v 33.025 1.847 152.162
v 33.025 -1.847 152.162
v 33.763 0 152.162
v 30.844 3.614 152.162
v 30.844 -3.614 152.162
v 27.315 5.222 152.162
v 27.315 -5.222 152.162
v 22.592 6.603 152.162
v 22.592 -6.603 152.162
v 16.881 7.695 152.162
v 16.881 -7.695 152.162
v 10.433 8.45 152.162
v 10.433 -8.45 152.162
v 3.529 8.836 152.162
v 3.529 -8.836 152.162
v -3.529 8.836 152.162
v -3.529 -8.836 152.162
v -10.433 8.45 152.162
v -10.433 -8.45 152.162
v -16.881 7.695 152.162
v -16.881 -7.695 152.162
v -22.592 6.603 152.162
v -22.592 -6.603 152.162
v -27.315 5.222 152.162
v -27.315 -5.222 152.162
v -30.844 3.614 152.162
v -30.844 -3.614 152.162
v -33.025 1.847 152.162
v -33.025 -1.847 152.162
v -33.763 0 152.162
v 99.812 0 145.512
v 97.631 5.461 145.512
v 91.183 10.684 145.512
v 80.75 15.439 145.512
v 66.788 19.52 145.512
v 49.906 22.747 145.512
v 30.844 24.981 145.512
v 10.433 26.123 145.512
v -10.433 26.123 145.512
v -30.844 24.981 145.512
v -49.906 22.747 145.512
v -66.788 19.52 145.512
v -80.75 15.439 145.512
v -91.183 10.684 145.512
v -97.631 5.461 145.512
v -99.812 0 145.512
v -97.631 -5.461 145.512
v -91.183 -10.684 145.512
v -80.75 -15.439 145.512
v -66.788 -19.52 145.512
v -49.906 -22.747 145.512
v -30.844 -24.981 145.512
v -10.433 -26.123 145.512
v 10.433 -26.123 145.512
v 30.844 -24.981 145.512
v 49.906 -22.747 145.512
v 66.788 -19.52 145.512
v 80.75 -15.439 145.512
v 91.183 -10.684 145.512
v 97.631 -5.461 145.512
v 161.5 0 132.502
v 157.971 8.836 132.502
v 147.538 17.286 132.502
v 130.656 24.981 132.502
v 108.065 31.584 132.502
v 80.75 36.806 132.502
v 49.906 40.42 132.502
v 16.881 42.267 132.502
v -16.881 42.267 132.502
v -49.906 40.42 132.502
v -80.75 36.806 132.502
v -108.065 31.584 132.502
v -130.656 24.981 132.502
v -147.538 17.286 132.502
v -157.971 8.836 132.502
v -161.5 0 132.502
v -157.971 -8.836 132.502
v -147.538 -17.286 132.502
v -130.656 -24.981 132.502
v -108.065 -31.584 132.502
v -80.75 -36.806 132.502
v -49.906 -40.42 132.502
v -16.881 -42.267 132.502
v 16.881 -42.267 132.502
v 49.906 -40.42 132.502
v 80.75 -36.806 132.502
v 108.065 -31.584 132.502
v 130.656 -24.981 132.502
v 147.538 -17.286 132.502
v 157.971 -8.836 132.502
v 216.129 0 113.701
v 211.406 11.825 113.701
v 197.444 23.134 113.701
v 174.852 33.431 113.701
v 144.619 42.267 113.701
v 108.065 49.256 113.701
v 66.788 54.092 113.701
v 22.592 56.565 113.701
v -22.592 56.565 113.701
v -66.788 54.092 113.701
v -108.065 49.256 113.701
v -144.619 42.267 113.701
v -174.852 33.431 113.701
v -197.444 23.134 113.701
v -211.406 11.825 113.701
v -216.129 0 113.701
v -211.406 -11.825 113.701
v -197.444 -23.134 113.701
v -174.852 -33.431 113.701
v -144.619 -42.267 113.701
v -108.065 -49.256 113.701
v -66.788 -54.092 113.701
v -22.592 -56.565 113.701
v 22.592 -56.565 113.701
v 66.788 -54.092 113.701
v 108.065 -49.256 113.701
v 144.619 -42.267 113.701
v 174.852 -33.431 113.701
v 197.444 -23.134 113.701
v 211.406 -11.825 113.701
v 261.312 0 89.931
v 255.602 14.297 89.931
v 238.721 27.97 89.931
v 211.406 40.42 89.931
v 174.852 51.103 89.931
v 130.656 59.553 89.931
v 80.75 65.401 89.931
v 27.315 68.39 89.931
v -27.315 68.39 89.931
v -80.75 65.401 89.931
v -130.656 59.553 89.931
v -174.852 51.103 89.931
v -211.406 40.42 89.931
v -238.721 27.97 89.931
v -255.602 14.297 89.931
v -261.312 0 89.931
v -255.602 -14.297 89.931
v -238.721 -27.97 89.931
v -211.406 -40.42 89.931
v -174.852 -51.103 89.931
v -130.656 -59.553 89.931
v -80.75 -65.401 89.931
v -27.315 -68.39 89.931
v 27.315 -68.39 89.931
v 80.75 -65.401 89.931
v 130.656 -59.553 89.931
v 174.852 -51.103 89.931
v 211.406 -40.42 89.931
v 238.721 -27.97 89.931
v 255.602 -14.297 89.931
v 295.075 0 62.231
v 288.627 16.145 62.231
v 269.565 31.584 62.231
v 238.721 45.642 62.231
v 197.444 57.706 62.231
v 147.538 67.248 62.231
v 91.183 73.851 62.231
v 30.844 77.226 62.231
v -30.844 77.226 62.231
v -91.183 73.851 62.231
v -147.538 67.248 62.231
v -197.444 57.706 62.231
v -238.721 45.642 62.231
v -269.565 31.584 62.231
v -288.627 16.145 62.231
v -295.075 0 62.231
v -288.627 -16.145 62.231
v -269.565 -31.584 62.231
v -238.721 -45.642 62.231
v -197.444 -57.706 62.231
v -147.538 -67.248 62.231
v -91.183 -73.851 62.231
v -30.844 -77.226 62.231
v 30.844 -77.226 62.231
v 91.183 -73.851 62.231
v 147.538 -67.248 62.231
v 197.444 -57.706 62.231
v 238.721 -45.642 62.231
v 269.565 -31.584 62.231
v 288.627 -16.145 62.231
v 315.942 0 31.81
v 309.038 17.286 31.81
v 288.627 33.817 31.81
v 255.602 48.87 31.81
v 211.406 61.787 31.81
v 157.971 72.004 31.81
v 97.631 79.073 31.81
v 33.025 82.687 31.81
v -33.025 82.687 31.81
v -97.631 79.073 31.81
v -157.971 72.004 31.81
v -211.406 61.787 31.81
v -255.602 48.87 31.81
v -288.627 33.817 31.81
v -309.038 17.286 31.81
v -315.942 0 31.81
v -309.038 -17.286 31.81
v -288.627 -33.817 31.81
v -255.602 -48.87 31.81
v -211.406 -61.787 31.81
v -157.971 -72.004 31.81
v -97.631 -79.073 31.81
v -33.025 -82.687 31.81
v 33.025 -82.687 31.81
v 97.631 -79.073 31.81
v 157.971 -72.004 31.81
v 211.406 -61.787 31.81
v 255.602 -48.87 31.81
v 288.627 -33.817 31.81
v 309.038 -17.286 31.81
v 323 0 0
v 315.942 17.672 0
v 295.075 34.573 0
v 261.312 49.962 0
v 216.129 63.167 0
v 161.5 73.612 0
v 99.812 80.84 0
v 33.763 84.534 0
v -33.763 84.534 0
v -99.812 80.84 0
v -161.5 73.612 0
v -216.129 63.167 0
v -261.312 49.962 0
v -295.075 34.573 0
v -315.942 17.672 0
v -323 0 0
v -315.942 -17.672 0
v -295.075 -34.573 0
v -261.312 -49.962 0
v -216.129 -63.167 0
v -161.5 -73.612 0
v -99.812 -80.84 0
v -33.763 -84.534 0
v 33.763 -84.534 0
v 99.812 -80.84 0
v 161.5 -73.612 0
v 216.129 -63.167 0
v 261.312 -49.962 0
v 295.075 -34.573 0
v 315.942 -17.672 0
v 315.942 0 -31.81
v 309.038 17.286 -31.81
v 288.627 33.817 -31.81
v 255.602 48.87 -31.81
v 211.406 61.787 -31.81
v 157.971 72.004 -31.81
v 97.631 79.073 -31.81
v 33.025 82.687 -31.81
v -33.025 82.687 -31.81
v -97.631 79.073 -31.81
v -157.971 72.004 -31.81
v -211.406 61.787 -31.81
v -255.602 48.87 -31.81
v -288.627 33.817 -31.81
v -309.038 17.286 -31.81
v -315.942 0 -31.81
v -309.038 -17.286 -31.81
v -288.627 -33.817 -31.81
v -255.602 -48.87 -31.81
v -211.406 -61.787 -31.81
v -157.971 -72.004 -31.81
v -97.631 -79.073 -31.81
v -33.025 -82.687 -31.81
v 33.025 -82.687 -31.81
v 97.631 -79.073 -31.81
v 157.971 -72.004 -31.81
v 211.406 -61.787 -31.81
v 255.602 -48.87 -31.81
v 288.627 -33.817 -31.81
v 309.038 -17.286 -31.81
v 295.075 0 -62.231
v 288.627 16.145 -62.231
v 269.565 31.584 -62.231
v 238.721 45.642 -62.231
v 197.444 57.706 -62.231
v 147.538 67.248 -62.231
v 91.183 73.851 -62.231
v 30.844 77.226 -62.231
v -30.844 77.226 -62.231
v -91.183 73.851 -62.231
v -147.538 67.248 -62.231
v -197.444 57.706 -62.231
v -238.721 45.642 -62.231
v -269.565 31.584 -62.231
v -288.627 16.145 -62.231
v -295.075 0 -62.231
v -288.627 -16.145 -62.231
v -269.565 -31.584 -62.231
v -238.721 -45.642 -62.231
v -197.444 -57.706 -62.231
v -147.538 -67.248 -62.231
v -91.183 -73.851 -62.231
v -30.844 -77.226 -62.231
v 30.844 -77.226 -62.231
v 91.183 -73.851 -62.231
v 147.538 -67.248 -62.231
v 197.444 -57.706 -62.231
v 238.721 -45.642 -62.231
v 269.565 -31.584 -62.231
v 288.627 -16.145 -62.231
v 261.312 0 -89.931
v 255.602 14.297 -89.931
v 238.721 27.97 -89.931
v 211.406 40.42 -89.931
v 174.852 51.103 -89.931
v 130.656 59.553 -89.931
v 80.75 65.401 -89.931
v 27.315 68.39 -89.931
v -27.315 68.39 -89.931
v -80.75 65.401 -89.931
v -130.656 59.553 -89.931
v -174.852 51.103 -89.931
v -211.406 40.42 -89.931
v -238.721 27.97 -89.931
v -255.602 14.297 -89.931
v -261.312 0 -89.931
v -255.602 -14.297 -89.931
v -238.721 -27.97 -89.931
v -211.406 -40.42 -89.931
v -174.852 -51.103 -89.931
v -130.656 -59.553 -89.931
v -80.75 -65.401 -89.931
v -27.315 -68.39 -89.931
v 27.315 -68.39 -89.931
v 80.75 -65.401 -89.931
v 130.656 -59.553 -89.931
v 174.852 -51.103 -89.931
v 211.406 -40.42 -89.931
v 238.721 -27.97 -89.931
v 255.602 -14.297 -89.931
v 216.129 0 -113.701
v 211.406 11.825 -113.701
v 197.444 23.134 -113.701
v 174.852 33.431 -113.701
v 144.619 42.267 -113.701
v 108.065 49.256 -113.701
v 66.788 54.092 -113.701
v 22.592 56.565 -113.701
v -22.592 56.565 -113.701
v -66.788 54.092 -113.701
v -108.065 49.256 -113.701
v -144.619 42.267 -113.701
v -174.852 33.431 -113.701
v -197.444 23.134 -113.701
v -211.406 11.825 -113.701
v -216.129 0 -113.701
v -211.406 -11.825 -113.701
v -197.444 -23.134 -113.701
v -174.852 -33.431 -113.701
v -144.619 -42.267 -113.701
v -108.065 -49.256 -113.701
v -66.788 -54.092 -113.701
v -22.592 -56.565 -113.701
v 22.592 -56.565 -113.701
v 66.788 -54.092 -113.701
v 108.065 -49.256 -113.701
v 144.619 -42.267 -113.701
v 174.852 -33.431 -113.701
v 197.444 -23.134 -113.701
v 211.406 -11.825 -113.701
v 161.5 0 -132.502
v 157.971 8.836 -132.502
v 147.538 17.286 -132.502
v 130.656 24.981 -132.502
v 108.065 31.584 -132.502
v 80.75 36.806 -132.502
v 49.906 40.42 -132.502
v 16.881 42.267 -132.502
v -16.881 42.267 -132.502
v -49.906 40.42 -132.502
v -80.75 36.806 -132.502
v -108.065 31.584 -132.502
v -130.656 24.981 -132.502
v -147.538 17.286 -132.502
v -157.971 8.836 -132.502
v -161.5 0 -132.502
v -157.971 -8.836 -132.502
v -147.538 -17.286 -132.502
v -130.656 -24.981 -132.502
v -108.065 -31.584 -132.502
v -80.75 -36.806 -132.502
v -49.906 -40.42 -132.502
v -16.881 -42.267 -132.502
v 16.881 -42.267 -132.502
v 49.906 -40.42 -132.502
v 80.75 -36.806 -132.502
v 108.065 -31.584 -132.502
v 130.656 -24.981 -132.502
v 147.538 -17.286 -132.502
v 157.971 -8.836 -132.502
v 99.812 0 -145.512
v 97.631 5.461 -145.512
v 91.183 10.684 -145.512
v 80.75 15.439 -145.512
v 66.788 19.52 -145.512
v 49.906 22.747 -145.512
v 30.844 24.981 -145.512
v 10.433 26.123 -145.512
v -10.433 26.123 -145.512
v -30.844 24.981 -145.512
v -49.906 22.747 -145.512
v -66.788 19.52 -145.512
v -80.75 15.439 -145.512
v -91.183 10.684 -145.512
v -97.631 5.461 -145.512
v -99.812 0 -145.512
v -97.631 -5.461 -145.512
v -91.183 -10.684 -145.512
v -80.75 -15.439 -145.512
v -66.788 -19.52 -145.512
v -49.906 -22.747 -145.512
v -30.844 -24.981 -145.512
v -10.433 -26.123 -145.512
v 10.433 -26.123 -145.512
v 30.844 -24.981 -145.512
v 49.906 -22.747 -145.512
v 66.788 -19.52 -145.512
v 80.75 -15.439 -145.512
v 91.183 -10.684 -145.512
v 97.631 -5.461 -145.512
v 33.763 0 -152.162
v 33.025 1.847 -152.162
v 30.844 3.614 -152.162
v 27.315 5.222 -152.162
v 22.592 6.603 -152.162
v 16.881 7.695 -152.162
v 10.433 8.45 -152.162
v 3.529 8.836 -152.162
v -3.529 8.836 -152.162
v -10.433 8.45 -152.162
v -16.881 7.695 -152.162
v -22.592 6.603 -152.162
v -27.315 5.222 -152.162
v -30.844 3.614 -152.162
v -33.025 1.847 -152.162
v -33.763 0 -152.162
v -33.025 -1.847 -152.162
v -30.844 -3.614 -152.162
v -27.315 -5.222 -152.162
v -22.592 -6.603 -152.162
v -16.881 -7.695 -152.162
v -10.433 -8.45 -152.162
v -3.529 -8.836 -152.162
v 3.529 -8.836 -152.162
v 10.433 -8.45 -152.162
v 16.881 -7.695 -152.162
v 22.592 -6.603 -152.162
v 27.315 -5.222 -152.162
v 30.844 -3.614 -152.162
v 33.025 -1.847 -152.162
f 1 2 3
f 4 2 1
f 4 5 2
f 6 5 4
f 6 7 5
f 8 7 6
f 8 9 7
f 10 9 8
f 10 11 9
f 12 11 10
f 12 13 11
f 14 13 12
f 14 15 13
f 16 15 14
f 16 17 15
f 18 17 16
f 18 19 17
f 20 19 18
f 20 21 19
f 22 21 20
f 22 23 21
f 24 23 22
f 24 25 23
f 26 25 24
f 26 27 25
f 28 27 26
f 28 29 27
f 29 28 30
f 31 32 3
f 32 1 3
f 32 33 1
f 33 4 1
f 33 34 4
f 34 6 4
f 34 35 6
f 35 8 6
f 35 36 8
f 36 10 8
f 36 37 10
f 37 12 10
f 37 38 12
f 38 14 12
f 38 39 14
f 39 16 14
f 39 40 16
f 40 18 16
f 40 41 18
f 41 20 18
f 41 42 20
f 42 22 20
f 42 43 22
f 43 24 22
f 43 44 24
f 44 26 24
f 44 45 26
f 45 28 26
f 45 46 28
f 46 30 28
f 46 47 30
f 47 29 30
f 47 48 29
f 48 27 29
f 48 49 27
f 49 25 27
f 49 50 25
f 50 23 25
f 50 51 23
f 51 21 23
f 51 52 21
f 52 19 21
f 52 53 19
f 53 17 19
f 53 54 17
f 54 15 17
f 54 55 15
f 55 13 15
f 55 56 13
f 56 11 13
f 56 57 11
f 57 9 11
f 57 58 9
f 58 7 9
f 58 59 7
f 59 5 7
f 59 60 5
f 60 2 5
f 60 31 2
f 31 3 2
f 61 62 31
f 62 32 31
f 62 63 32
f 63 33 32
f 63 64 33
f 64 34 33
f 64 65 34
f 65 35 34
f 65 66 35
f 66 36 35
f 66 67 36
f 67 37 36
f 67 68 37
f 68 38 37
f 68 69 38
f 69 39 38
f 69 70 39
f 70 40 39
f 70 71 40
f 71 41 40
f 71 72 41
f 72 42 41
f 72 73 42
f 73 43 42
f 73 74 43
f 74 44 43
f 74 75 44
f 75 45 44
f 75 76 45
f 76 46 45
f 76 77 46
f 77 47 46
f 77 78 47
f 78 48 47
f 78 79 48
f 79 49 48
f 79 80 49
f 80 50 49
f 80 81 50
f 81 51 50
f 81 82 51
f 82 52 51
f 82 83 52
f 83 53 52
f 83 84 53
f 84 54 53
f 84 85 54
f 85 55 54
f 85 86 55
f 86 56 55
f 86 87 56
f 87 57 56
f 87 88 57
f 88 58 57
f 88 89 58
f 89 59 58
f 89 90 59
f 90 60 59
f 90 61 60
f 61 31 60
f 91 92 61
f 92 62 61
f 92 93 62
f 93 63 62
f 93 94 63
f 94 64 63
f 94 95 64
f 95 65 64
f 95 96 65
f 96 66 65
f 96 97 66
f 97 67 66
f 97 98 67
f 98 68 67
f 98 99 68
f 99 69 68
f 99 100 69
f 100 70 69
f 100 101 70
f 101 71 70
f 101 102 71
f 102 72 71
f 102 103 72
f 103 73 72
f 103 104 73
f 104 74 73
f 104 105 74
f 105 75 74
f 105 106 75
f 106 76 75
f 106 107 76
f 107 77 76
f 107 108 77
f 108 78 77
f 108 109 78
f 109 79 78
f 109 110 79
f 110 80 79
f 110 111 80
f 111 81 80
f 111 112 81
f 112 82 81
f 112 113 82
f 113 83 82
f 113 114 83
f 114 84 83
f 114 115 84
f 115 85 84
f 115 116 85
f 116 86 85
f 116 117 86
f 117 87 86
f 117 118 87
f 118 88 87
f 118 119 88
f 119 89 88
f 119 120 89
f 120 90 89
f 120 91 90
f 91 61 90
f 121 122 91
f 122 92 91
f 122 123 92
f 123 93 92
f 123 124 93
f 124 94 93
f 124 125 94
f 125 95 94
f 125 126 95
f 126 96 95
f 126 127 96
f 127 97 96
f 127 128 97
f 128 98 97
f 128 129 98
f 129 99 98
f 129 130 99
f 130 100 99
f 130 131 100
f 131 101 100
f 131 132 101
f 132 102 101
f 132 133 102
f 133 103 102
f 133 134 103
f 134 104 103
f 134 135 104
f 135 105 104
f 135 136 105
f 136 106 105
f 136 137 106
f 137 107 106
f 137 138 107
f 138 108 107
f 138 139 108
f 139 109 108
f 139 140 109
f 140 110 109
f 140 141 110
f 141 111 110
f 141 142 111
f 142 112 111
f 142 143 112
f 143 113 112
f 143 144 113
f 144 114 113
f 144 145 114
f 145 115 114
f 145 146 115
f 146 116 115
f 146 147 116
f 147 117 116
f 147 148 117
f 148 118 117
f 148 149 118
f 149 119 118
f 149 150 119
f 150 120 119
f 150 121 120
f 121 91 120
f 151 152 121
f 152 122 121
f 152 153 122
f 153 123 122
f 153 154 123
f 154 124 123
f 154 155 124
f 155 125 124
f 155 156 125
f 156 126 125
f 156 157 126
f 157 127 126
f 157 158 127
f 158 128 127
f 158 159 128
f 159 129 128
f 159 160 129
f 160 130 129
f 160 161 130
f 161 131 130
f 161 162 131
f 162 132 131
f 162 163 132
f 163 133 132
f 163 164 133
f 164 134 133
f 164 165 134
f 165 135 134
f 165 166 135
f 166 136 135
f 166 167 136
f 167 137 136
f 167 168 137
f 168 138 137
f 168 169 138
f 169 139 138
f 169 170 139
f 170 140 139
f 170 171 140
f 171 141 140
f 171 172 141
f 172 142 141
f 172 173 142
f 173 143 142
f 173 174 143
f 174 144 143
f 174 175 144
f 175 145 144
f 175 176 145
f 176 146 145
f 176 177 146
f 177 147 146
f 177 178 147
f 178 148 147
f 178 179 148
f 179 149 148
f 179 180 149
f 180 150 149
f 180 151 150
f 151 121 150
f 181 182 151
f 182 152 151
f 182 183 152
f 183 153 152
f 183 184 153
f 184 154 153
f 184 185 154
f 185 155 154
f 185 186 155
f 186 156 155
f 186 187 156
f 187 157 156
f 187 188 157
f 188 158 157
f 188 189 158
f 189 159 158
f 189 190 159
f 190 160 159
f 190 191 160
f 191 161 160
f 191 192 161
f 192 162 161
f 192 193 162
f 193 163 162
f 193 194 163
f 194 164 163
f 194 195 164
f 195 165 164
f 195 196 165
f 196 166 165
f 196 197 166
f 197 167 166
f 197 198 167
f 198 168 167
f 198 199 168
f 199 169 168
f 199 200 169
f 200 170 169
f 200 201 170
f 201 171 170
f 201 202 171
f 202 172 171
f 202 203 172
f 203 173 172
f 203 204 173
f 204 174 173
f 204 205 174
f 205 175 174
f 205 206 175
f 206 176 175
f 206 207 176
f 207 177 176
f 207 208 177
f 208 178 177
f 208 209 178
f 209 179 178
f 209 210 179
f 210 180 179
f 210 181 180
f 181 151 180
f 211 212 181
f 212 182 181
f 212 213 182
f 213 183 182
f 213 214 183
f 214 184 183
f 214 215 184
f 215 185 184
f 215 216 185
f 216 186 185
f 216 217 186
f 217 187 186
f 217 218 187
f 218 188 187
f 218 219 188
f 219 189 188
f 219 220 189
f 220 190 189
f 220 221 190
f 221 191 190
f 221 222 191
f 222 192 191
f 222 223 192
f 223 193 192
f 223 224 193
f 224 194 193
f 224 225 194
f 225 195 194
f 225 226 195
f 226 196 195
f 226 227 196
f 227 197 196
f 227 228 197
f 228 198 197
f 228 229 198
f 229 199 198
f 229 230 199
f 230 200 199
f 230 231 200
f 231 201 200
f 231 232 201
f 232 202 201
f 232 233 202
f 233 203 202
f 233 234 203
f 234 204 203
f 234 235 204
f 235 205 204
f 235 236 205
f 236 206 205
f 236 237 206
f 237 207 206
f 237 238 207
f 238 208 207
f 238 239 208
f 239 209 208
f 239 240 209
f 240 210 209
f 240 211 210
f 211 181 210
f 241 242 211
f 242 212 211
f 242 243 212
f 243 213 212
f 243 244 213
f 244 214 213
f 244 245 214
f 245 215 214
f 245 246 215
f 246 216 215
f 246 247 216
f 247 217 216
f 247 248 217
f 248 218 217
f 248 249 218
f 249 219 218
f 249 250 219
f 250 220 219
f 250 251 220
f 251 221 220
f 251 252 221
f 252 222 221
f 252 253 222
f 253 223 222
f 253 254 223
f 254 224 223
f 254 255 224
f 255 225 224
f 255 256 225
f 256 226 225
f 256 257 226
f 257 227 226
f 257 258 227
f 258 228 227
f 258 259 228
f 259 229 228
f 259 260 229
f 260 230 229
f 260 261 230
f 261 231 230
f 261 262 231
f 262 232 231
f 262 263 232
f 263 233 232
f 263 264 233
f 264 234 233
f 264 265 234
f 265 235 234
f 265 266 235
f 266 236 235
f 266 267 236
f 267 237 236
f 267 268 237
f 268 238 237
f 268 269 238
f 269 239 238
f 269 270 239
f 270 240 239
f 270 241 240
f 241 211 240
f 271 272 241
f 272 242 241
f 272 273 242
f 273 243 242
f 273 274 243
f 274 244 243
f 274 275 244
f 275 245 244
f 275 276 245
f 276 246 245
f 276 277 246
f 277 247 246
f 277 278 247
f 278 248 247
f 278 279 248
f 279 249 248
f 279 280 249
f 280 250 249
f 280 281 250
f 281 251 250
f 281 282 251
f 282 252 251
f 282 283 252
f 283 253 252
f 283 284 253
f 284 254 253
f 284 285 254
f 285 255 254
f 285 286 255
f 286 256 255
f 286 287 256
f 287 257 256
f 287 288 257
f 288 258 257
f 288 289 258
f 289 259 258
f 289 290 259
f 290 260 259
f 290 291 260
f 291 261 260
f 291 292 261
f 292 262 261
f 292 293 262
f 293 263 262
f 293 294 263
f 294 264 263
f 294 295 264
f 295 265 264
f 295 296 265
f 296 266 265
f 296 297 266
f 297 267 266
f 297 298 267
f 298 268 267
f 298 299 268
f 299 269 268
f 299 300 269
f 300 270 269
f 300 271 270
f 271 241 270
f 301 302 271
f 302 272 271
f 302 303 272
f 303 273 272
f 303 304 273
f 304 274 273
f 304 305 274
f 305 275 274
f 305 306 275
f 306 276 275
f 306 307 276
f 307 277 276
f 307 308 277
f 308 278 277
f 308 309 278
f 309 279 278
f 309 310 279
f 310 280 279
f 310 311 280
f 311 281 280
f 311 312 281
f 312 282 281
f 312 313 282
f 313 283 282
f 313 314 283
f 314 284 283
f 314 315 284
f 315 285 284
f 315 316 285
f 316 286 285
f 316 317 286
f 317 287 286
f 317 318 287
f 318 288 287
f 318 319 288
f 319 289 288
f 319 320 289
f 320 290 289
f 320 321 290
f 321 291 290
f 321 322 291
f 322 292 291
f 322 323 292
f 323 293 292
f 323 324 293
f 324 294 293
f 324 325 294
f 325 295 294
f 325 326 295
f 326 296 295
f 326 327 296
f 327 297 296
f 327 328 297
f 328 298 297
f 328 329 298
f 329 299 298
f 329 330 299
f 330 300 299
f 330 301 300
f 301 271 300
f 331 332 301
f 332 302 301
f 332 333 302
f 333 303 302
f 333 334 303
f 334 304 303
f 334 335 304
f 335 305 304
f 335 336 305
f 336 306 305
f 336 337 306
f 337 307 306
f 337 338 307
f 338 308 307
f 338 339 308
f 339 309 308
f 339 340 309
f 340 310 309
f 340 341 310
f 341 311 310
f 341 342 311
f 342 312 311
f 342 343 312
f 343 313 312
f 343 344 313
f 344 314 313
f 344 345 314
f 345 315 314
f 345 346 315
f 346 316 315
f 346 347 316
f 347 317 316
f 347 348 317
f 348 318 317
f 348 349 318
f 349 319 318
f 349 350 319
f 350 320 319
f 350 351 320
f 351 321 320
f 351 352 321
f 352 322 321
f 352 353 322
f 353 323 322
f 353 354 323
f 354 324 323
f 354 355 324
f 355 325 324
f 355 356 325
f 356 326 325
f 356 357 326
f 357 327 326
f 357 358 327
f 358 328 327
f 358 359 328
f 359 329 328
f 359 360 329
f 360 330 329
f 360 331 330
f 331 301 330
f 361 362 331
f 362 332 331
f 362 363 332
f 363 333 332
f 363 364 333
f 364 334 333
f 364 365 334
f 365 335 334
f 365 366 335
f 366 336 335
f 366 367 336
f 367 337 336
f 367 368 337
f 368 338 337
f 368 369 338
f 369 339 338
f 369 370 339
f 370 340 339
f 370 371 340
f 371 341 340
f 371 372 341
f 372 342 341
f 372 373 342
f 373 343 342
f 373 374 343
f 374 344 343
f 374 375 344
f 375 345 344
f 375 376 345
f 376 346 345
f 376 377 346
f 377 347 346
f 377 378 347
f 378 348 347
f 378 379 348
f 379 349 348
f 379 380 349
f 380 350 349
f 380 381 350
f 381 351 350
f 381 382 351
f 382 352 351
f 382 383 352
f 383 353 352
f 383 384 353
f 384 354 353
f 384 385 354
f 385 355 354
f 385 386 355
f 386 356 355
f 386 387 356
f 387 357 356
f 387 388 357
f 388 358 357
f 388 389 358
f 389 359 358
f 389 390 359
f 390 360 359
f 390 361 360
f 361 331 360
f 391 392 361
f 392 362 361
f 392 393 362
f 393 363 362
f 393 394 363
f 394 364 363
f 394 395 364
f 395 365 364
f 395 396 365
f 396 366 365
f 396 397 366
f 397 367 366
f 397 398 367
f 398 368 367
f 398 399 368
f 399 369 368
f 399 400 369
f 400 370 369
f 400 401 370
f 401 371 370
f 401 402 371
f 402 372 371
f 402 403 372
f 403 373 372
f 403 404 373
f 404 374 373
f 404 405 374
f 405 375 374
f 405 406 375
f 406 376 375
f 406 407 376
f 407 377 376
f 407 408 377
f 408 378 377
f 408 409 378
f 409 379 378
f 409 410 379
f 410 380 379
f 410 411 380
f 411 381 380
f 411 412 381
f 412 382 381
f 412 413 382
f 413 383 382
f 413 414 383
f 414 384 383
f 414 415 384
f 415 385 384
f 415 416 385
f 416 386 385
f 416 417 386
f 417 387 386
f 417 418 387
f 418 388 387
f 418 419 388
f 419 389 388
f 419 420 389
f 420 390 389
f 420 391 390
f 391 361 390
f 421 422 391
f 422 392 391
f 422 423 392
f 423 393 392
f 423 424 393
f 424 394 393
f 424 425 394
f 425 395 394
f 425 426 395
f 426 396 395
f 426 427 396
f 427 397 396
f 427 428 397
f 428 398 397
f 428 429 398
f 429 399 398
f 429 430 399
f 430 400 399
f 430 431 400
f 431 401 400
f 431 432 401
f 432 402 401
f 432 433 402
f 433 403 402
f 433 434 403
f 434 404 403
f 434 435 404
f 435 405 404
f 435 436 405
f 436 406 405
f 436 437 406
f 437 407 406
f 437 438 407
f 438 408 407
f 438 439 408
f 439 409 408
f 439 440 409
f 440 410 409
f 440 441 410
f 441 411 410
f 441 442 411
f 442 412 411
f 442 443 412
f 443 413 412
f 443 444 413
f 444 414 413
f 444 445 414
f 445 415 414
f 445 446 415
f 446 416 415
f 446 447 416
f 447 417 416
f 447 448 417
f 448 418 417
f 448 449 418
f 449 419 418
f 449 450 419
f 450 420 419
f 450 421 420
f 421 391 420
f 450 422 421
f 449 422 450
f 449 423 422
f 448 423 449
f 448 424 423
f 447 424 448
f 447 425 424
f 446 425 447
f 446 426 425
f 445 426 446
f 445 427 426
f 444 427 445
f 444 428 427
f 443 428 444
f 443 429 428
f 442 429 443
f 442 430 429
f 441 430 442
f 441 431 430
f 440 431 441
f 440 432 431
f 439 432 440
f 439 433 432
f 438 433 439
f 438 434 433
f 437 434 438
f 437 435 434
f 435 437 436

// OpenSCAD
// Generated by SolidPython 1.0.1 on 2020-07-29 00:46:53


scale(v = [19, 5, 9]) {
	sphere(r = 17);
}
/***********************************************
*********      SolidPython code:      **********
************************************************
 
# import packages: SolidPython
from solid import *
from solid.utils import *
from itertools import chain, combinations, permutations


class Resize:

    def __init__(self, scad_file):
        self.scad_file = scad_file
        #self.scad_file = import_scad(scad_file)
        # cone/cylinder param:
        self.r1 = 0
        self.r2 = 0
        self.h = 0
        # rectangular prism param:
        self.w = 0
        self.l = 0
        # ellipse param:
        self.r = 0

    # import OpenScad code (file name corresponds to shape)


    # classify shape + parameters
    def assign(self, param1, param2, param3):
        if self.scad_file == 'cone.scad':
            self.r1 = param1
            self.r2 = param2
            self.h = param3
        elif self.scad_file == 'cylinder.scad':
            self.r1 = param1
            self.r2 = param2
            self.h = param3
        elif self.scad_file == 'rectangularPrism.scad':
            self.h = param1
            self.l = param2
            self.w = param3
        else:
            self.r = param1
            self.h = param2

    # resize parameters
    def iterate(self):
        x = range(3, 20, 2)
        i = 1
        if self.scad_file == 'cone.scad':
            tempList = list(permutations(x, 2))
            for temp in tempList:
                param1 = temp[0]
                param2 = temp[1]
                filepath = 'produced_scad_files/' + 'cone' + str(param1) + '_' + str(param2) + '_' + '.scad'
                scad_render_to_file(cylinder(h=param1, r1=param2, r2=0), filepath)

        elif self.scad_file == 'cylinder.scad':
            tempList = list(permutations(x, 3))
            for temp in tempList:
                param1 = temp[0]
                param2 = temp[1]
                filepath = 'produced_scad_files/' + 'cylinder' + str(param1) + '_' + str(param2) + '_' + '.scad'
                scad_render_to_file(cylinder(h=param1, r1=param2, r2=param2), filepath)

        elif self.scad_file == 'rectangularPrism.scad':
            tempList = list(permutations(x, 3))
            for temp in tempList:
                param1 = temp[0]
                param2 = temp[1]
                param3 = temp[2]
                filepath = 'produced_scad_files/' + 'rectangularPrism' + str(param1) + '_' + str(param2) + '_' + str(
                    param3) + '.scad'
                scad_render_to_file(cube(size=(param1, param2, param3)), filepath)

        elif self.scad_file == 'ellipse.scad':
            tempList = list(permutations(x, 4))
            for temp in tempList:
                param1 = temp[0]
                param2 = temp[1]
                param3 = temp[2]
                param4 = temp[3]
                filepath = 'produced_scad_files/' + 'ellipse' + str(param1) + '_' + str(param2) + '_' + str(param3) + '_' + str(param4) + '.scad'
                scad_render_to_file(scale([param1, param2, param3])(sphere(r=param4)), filepath)

    def render_to_scadfile(self):
        scad_render_to_file(scad, 'example.scad') 
 
************************************************/
